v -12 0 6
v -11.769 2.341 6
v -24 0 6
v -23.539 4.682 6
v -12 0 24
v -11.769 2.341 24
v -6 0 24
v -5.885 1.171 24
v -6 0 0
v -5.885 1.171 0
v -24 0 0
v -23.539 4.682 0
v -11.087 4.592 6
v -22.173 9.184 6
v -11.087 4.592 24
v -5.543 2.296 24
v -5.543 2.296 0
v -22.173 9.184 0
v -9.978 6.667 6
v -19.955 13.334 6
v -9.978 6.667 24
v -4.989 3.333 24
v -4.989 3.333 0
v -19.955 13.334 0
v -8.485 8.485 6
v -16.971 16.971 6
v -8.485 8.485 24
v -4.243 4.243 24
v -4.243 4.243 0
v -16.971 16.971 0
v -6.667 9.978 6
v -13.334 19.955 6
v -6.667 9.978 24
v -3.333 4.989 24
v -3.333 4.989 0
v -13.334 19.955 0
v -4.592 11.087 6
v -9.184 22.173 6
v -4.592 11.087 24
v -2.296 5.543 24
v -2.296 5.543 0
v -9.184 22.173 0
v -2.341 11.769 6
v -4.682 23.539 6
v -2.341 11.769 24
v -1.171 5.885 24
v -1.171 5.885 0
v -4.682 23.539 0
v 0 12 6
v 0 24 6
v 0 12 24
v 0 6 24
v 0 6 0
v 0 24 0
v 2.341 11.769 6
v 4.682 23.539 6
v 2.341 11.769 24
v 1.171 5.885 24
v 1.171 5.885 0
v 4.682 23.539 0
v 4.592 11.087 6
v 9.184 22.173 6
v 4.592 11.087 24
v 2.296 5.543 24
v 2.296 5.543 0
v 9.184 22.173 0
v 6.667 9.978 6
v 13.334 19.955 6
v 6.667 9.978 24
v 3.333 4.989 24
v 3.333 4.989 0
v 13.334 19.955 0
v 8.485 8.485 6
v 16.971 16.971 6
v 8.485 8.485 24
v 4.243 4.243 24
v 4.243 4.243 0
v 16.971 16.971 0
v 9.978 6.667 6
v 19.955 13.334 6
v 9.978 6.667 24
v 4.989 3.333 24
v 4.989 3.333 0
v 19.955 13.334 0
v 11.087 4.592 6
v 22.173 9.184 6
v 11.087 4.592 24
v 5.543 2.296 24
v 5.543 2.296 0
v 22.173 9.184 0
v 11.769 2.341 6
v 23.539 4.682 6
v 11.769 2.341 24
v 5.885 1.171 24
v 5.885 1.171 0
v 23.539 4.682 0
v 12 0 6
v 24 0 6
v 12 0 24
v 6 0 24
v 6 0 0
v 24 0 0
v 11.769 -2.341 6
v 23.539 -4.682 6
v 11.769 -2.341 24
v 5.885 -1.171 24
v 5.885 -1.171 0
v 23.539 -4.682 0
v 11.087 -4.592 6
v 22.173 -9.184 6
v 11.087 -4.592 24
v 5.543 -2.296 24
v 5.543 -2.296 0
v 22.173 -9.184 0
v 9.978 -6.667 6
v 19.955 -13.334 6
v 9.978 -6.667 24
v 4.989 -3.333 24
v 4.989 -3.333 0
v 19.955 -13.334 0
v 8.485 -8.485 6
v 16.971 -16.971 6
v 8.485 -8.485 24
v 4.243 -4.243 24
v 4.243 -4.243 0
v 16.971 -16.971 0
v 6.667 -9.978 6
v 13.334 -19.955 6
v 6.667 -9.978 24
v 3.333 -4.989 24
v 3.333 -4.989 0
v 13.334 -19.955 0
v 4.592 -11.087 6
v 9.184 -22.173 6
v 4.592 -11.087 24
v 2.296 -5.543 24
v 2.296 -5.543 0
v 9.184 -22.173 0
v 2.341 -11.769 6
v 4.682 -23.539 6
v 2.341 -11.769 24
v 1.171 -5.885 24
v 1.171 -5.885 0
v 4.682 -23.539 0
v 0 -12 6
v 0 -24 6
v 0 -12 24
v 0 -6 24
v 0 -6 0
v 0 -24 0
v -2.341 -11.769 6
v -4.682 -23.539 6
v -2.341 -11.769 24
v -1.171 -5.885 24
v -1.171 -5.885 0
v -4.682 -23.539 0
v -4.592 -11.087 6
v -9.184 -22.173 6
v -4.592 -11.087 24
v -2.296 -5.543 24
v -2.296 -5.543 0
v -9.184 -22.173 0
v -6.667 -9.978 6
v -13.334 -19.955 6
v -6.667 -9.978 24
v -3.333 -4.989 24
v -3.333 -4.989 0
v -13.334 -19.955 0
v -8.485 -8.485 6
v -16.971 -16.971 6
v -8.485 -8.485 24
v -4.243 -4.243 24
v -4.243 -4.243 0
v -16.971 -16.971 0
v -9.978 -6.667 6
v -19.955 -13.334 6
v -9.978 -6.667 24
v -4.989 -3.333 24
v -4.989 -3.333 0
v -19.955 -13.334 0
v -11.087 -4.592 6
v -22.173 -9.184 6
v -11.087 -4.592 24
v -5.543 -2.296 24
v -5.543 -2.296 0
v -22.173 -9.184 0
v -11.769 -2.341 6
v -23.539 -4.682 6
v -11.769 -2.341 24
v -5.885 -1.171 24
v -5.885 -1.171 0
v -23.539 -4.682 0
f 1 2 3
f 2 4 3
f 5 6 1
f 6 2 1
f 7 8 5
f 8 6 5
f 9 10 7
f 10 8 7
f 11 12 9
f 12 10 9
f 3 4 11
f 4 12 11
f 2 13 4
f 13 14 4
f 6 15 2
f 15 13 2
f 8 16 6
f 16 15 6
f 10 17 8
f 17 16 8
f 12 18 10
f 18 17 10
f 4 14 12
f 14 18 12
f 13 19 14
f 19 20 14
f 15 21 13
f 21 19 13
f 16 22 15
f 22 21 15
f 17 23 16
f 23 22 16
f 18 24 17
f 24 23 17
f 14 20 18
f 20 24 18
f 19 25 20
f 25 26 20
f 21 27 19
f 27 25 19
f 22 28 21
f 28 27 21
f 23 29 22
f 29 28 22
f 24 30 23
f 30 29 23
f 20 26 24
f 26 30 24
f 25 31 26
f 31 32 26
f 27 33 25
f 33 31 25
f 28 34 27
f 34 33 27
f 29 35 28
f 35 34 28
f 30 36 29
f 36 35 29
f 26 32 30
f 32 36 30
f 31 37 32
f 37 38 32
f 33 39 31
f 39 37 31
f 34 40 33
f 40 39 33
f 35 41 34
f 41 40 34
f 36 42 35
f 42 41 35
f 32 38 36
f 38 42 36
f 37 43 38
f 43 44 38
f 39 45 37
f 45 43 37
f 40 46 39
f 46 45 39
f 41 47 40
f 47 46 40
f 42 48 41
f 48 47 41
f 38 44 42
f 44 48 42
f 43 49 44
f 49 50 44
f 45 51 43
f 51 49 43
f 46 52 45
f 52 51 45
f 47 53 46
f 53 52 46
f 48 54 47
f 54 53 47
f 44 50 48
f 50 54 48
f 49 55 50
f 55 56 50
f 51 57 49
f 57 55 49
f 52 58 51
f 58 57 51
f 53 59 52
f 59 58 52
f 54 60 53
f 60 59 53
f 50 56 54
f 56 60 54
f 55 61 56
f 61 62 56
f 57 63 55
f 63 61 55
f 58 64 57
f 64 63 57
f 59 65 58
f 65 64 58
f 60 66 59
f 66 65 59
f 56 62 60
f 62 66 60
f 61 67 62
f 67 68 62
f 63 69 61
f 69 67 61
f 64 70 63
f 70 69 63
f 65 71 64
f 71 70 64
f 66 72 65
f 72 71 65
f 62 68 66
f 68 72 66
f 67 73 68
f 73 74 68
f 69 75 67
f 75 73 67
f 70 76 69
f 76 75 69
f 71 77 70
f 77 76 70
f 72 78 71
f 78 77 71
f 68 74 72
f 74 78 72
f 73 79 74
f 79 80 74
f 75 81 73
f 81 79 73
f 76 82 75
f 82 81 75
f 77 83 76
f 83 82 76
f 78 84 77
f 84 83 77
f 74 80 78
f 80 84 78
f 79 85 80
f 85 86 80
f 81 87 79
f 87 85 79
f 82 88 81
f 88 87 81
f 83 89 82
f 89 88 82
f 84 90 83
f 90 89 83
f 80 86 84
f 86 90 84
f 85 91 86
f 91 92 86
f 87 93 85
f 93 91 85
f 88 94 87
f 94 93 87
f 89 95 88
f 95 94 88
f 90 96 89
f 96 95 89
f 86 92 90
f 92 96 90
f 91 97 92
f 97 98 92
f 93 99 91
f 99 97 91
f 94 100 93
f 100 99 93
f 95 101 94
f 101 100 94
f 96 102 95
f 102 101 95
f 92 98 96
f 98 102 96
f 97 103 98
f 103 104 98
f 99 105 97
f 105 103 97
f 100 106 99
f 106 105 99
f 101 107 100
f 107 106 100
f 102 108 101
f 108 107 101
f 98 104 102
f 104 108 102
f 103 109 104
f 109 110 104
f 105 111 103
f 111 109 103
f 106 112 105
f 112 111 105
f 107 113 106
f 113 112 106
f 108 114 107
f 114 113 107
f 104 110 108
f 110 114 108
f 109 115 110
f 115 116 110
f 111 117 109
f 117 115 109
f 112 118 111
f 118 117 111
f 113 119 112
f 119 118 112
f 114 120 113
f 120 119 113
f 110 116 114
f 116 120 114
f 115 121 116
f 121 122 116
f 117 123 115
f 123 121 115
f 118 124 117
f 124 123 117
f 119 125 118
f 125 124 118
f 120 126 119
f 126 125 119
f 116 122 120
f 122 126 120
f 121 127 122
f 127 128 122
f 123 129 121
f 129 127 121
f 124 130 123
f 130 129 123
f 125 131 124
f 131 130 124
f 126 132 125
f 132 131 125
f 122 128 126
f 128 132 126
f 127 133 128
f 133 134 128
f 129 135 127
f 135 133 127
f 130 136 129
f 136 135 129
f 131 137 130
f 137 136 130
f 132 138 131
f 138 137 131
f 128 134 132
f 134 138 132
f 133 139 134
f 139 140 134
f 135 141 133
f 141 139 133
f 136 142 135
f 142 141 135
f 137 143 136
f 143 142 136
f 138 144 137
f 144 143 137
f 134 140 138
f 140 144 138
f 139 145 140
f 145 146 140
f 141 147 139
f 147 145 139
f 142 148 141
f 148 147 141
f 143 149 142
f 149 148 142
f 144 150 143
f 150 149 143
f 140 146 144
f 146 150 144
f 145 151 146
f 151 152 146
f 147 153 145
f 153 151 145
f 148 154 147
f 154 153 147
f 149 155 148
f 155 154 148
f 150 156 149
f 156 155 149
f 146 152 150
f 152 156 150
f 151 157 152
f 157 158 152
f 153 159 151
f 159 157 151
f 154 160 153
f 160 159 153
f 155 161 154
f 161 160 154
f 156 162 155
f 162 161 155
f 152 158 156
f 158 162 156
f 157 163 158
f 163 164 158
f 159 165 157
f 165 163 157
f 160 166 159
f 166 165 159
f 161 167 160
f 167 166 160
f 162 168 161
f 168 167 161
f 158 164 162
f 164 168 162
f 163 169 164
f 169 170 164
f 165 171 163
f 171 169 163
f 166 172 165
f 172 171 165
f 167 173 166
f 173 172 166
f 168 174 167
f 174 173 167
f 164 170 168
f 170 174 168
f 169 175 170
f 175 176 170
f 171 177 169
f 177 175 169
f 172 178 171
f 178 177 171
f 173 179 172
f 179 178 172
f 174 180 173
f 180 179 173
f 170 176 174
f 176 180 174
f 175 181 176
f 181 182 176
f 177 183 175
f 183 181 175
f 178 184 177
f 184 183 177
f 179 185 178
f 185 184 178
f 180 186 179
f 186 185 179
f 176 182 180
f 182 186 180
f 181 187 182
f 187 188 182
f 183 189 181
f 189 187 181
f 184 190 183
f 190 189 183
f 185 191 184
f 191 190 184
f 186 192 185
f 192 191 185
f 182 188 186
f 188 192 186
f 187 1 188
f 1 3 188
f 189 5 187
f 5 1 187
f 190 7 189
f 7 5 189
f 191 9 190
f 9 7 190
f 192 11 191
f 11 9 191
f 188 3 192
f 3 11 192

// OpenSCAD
$fn = 32;

// ----------------------------------------------------------------------
// Revolved part: flanged bushing R24
// ----------------------------------------------------------------------

// --- parameters (mm) ---
bore_r = 6;               // bore radius
flange_r = 24;            // flange radius
flange_h = 6;             // flange thickness
sleeve_r = 12;            // sleeve radius
total_h = 24;             // overall height
revolve_angle = 360;      // revolve sweep, degrees

bore_d = 2 * bore_r;
flange_d = 2 * flange_r;
sleeve_d = 2 * sleeve_r;

profile = [[6, 0], [24, 0], [24, 6], [12, 6], [12, 24], [6, 24]];  // primary outline, 6 points, counter clockwise

// --- the one profile operation ---
rotate_extrude(angle = revolve_angle) polygon(points = profile);
